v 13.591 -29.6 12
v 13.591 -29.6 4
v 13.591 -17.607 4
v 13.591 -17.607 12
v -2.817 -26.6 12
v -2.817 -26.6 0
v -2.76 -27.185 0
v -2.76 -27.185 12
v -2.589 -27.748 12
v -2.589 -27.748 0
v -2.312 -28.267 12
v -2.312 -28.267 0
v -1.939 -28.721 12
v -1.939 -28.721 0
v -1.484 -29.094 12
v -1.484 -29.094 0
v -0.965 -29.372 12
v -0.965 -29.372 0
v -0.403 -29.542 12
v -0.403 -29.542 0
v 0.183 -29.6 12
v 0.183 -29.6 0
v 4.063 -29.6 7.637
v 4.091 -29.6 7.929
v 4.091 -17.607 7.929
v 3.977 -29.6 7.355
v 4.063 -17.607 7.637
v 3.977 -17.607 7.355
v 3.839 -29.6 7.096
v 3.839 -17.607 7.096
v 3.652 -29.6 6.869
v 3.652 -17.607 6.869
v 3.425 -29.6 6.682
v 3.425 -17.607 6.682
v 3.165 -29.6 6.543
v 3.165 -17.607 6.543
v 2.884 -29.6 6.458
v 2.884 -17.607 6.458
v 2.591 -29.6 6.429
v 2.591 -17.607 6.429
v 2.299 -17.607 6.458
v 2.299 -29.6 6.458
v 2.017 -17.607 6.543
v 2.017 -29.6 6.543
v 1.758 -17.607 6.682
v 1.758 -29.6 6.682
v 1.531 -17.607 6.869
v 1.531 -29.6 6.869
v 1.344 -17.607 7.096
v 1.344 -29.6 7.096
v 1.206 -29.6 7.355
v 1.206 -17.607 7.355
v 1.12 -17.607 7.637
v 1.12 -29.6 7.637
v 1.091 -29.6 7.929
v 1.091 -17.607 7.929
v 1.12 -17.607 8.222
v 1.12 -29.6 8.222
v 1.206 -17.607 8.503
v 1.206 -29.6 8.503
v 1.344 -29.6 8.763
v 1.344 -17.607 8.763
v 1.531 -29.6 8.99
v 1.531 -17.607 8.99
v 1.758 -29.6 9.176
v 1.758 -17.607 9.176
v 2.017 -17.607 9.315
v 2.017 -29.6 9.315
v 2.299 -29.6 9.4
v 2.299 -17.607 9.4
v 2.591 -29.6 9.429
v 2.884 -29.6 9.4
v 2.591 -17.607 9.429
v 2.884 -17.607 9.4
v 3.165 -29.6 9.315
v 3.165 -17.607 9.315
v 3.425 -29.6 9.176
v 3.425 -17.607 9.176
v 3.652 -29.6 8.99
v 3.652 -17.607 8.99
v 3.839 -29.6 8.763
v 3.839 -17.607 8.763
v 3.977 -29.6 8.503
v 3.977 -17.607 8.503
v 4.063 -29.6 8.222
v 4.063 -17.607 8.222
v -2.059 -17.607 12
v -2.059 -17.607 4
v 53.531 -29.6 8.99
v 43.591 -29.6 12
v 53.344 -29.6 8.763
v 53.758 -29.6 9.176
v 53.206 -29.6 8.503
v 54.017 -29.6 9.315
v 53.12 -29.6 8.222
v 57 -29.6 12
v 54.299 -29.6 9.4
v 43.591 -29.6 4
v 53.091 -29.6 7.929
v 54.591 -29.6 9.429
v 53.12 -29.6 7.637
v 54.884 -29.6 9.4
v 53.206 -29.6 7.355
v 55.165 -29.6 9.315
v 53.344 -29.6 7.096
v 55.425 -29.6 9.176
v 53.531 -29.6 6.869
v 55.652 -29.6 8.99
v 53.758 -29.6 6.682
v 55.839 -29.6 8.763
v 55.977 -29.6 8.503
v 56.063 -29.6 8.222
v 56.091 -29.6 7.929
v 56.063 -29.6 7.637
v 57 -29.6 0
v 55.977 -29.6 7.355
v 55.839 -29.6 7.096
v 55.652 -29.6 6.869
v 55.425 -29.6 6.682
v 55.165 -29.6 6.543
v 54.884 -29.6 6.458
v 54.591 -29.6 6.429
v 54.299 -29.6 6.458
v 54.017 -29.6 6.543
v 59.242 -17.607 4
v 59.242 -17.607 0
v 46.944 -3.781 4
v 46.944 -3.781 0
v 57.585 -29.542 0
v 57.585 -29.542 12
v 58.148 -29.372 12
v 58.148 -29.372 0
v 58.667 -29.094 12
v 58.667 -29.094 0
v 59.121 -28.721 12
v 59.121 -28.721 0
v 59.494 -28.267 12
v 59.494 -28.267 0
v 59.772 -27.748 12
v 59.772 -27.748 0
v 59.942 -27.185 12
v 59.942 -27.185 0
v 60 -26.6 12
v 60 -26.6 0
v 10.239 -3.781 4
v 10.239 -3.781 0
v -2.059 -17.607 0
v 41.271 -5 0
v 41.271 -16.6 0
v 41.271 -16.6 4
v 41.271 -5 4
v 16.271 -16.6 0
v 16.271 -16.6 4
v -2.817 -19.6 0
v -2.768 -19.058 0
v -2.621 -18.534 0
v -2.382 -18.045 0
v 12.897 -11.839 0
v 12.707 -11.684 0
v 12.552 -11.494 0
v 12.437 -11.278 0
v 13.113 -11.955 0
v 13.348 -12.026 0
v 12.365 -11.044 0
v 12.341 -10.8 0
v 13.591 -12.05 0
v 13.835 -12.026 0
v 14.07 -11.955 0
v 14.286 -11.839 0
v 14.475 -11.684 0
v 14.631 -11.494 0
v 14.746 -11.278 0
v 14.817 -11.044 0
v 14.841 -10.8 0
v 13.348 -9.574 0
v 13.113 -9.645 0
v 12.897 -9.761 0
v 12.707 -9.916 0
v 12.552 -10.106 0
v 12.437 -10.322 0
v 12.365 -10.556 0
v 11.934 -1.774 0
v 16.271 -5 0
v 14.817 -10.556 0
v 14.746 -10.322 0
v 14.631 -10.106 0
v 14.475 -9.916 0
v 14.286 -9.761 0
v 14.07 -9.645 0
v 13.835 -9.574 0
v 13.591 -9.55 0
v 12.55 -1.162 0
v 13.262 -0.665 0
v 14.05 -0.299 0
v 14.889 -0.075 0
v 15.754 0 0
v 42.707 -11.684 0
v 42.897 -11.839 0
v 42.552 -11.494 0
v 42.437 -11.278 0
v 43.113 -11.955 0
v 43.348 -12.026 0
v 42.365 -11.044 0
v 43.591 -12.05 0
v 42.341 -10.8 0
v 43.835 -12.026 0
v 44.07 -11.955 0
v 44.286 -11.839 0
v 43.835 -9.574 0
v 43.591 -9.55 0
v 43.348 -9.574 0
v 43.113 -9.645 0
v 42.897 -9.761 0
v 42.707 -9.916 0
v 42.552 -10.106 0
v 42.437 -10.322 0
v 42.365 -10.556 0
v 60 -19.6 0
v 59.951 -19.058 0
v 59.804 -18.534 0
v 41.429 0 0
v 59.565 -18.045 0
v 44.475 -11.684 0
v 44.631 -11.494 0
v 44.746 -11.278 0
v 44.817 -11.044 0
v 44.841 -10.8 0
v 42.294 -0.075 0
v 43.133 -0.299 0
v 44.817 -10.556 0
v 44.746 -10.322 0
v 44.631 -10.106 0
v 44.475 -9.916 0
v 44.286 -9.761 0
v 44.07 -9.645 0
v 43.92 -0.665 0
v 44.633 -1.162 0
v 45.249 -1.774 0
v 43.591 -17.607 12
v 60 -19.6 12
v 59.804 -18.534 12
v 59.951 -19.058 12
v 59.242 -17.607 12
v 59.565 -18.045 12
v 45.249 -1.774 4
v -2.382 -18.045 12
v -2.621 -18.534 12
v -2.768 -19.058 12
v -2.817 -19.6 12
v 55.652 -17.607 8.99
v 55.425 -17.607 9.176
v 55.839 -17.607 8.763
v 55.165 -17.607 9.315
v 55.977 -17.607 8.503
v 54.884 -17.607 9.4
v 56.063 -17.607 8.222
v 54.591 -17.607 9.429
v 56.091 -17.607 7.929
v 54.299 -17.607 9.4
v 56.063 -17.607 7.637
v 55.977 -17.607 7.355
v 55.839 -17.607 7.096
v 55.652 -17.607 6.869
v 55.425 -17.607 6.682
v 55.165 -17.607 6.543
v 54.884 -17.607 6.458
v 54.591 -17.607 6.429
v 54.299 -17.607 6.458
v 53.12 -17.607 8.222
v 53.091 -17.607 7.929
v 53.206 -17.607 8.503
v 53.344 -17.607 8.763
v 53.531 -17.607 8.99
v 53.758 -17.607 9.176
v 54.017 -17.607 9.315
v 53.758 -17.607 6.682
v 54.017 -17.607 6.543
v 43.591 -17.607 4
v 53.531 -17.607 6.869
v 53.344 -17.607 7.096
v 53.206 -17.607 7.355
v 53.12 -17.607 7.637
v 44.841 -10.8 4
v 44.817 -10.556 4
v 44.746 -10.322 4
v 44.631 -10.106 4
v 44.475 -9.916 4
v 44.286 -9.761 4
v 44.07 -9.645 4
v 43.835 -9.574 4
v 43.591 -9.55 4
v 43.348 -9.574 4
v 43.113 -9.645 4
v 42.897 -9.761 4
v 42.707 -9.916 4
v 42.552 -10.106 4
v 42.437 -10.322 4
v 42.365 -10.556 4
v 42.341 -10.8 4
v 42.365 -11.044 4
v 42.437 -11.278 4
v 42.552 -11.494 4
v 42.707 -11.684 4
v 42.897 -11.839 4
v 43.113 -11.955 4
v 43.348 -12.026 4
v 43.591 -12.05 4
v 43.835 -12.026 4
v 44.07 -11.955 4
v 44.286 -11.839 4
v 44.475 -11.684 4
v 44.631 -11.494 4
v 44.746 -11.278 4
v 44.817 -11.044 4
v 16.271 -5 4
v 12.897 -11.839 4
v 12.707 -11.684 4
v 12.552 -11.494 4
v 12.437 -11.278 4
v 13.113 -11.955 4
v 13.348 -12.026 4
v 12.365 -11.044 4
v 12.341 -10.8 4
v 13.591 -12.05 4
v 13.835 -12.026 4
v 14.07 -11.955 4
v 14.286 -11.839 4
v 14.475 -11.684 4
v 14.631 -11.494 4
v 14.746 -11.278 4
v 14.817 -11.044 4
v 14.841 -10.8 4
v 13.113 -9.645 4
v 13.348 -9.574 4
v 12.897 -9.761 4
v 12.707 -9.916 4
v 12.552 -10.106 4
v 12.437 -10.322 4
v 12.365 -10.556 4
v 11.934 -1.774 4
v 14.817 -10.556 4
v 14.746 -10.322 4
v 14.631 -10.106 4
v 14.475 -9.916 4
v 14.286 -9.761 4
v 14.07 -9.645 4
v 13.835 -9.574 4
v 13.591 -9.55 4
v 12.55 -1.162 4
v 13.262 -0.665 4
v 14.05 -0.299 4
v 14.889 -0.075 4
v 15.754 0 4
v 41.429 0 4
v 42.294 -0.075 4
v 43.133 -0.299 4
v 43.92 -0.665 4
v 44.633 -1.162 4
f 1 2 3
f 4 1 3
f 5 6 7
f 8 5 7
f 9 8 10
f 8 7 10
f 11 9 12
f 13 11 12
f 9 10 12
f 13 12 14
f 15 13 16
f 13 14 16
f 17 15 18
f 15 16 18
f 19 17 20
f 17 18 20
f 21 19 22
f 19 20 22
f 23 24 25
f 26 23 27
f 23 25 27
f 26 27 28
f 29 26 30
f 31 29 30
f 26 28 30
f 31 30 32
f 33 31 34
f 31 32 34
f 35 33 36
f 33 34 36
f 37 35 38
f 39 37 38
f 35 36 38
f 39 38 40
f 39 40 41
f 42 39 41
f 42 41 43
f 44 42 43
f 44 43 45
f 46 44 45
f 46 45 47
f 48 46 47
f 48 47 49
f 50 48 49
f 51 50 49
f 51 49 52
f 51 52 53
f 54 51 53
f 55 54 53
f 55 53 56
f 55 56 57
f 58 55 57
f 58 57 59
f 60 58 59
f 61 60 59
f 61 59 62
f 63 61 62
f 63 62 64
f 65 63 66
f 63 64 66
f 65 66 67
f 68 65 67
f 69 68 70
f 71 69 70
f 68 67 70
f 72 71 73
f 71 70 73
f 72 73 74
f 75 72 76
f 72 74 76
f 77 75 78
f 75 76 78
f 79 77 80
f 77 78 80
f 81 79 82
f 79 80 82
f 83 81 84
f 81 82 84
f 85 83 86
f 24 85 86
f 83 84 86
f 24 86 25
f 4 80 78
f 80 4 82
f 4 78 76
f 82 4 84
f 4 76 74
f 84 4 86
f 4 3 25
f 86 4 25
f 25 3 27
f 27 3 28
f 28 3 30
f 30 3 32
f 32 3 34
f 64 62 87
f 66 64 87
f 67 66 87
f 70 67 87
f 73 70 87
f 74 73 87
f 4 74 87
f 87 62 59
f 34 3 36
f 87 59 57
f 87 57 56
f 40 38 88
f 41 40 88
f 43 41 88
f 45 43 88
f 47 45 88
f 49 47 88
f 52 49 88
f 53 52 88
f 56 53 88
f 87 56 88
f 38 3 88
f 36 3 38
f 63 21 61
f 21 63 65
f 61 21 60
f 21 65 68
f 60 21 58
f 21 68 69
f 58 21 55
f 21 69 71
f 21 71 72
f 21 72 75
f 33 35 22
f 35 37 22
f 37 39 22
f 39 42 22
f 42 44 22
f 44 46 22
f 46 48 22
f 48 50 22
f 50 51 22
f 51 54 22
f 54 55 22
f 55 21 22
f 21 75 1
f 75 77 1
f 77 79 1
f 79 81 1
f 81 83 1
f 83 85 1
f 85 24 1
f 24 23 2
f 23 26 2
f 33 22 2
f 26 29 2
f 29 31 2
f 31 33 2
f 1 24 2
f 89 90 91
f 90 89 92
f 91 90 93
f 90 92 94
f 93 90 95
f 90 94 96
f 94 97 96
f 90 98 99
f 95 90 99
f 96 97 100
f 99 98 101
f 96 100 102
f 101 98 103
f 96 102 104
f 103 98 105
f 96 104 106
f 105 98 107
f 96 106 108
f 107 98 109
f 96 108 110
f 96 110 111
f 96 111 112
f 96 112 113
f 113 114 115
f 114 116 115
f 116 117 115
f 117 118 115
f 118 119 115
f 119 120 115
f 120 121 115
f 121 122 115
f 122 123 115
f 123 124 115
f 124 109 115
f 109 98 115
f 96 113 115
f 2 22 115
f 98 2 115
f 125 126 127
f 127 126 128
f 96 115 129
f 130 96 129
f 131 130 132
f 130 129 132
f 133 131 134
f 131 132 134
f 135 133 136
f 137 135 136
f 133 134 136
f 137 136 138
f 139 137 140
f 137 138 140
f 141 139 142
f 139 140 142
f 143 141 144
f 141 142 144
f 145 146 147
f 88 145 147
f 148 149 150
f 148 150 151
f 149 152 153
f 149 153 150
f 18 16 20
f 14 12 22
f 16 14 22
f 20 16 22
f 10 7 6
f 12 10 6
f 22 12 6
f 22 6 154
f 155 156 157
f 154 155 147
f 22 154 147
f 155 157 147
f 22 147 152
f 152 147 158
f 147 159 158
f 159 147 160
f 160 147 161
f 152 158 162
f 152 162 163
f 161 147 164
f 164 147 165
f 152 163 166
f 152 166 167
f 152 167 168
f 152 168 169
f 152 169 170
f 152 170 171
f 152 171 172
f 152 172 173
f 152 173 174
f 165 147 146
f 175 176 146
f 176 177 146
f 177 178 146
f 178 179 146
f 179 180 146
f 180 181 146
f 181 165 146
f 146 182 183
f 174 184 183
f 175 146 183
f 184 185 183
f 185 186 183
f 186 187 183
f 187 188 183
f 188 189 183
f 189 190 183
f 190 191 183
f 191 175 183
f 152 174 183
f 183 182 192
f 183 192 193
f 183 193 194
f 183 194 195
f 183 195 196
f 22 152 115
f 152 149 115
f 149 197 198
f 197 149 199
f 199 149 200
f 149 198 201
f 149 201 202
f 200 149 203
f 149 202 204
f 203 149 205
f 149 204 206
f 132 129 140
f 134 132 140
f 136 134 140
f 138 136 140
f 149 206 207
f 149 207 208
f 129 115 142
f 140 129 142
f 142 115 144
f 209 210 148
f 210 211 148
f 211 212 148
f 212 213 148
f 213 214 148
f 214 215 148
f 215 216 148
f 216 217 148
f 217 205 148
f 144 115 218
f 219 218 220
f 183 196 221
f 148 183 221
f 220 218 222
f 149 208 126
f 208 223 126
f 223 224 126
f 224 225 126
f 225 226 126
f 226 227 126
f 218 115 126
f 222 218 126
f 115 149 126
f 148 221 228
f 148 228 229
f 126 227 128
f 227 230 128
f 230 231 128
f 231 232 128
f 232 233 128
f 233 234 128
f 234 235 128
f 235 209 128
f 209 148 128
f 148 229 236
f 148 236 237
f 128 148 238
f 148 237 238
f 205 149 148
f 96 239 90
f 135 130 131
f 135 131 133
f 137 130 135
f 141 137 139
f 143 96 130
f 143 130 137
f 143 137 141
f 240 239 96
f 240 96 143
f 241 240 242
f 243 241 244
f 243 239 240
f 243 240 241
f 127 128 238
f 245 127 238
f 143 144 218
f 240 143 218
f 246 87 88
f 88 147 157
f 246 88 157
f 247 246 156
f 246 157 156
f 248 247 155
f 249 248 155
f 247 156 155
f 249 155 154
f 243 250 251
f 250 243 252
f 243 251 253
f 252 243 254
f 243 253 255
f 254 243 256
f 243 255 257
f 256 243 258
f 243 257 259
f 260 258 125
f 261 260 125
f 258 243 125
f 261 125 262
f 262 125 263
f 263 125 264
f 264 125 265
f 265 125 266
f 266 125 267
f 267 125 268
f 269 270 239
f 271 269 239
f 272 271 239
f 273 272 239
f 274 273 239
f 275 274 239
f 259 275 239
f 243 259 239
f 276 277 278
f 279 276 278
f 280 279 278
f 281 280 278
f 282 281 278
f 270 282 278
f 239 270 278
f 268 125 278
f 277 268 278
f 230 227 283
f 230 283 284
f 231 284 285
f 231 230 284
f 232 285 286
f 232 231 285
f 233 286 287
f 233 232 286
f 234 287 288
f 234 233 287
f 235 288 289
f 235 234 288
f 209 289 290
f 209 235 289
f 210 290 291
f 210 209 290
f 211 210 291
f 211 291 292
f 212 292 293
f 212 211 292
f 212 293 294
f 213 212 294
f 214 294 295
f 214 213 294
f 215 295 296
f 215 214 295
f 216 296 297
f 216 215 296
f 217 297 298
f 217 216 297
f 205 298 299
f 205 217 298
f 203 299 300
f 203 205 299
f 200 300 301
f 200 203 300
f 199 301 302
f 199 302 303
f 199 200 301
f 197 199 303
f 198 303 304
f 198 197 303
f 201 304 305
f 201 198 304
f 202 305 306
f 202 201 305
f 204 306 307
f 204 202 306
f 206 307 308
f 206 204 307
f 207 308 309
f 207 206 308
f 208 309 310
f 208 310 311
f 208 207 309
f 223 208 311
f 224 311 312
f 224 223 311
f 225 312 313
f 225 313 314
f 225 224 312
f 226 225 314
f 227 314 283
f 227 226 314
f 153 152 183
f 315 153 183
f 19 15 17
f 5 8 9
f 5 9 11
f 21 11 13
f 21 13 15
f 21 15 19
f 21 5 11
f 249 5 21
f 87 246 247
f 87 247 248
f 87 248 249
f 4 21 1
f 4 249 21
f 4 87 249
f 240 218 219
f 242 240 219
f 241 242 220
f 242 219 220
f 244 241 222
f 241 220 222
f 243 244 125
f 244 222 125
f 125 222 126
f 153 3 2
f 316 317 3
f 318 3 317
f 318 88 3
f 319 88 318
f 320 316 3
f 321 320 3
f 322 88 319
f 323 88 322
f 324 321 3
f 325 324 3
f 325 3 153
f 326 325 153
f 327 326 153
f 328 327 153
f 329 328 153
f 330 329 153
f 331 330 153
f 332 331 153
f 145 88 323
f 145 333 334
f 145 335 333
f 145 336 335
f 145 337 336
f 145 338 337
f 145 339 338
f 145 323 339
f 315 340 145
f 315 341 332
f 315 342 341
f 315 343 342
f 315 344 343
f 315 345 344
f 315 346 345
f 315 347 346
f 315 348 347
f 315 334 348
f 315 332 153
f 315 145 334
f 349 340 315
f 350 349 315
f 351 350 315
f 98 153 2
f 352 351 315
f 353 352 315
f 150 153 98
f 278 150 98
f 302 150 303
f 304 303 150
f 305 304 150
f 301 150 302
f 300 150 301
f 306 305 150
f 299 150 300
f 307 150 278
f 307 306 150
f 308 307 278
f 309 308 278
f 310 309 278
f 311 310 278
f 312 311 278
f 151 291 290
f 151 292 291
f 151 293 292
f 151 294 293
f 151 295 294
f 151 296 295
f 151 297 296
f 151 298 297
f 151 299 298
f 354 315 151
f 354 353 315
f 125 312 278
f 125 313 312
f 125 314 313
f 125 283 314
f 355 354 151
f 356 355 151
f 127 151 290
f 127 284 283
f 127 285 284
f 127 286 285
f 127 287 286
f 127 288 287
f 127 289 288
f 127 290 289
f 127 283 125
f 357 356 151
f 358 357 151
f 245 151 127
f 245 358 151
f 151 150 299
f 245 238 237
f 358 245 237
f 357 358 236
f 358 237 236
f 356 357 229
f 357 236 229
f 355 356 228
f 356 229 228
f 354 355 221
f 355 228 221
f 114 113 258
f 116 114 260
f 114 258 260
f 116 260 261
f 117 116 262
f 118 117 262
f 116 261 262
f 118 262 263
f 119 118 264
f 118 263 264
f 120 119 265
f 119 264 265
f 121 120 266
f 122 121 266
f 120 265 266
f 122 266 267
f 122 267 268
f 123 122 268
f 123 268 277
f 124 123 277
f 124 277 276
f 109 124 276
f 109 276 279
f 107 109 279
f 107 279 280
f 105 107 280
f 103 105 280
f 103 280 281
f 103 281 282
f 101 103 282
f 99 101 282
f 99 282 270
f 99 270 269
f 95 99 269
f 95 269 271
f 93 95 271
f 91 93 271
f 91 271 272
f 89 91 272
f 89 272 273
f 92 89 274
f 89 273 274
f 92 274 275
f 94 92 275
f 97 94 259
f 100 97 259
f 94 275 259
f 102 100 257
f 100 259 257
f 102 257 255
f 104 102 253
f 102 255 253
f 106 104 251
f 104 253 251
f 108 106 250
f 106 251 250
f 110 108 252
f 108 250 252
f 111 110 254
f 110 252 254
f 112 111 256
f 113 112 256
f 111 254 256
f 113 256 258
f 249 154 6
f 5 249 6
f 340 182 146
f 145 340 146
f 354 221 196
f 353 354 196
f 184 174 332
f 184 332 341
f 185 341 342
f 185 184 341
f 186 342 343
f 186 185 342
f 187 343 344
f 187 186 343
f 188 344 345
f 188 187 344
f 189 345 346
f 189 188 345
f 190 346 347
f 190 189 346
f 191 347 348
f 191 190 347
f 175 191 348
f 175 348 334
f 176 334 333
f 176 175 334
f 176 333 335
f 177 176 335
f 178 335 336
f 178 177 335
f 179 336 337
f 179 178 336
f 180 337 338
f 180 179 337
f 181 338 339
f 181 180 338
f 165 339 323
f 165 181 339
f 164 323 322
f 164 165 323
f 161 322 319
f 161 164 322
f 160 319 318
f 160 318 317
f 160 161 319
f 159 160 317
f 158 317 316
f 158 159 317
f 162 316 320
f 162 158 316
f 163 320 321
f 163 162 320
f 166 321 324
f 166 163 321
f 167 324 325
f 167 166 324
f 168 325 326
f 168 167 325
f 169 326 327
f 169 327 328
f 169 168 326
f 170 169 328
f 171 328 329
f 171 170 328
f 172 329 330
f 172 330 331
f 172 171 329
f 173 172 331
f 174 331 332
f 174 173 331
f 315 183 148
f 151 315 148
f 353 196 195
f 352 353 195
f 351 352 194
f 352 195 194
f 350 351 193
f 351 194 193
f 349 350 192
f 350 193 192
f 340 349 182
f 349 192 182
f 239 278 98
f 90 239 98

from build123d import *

# Parameters (mm, degrees)
SKETCH_1_W          = 25
SKETCH_1_H          = 11.6
SKETCH_1_R          = 1.25
EXTRUDE_2_DEPTH     = 4
EXTRUDE_3_DEPTH     = 12
SKETCH_2_R          = 1.5
CUT_EXTRUDE_1_DEPTH = 64.671080162


with BuildPart() as part:
    # 草图1 → 凸台-拉伸2 (new body)
    with BuildSketch(Plane.XY):
        with BuildLine():
            ThreePointArc((15.754115944, 0), (13.648249367, -0.465099124), (11.934157469, -1.773869616))
            Line((11.934157469, -1.773869616), (10.238822763, -3.781261572))
            Line((10.238822763, -3.781261572), (-2.059131374, -17.607))
            Line((-2.059131374, -17.607), (13.591371981, -17.607))
            Line((13.591371981, -17.607), (13.591371981, -29.6))
            Line((13.591371981, -29.6), (43.591371981, -29.6))
            Line((43.591371981, -29.6), (43.591371981, -17.607))
            Line((43.591371981, -17.607), (59.241875336, -17.607))
            Line((59.241875336, -17.607), (46.9439212, -3.781261572))
            Line((46.9439212, -3.781261572), (45.248586493, -1.773869616))
            ThreePointArc((45.248586493, -1.773869616), (43.534494596, -0.465099124), (41.428628019, 0))
            Line((41.428628019, 0), (15.754115944, 0))
        make_face()
        with Locations((28.771371981, -10.8)):
            Rectangle(SKETCH_1_W, SKETCH_1_H, mode=Mode.SUBTRACT)
        with Locations((13.591371981, -10.8)):
            Circle(SKETCH_1_R, mode=Mode.SUBTRACT)
        with Locations((43.591371981, -10.8)):
            Circle(SKETCH_1_R, mode=Mode.SUBTRACT)
    extrude(amount=EXTRUDE_2_DEPTH)

    # 草图1<4> → 凸台-拉伸3 (add)
    with BuildSketch(Plane.XY):
        with BuildLine():
            Line((13.591371981, -17.607), (-2.059131374, -17.607))
            ThreePointArc((-2.059131374, -17.607), (-2.621323899, -18.533838426), (-2.817256037, -19.6))
            Line((-2.817256037, -19.6), (-2.817256037, -26.6))
            ThreePointArc((-2.817256037, -26.6), (-1.938576381, -28.721320344), (0.182743963, -29.6))
            Line((0.182743963, -29.6), (13.591371981, -29.6))
            Line((13.591371981, -29.6), (13.591371981, -17.607))
        make_face()
        with BuildLine():
            ThreePointArc((60, -19.6), (59.804067862, -18.533838426), (59.241875336, -17.607))
            Line((59.241875336, -17.607), (43.591371981, -17.607))
            Line((43.591371981, -17.607), (43.591371981, -29.6))
            Line((43.591371981, -29.6), (57, -29.6))
            ThreePointArc((57, -29.6), (59.121320344, -28.721320344), (60, -26.6))
            Line((60, -26.6), (60, -19.6))
        make_face()
    extrude(amount=EXTRUDE_3_DEPTH)

    # 草图2 → 切除-拉伸1 (cut, through all)
    with BuildSketch(Plane(origin=(0, -17.607, 0), x_dir=(1, 0, 0), z_dir=(0, 1, 0))):
        with Locations((2.591371981, -7.929255465)):
            Circle(SKETCH_2_R)
        with Locations((54.591371981, -7.929255465)):
            Circle(SKETCH_2_R)
    extrude(amount=-CUT_EXTRUDE_1_DEPTH, mode=Mode.SUBTRACT)


solid = part.part
